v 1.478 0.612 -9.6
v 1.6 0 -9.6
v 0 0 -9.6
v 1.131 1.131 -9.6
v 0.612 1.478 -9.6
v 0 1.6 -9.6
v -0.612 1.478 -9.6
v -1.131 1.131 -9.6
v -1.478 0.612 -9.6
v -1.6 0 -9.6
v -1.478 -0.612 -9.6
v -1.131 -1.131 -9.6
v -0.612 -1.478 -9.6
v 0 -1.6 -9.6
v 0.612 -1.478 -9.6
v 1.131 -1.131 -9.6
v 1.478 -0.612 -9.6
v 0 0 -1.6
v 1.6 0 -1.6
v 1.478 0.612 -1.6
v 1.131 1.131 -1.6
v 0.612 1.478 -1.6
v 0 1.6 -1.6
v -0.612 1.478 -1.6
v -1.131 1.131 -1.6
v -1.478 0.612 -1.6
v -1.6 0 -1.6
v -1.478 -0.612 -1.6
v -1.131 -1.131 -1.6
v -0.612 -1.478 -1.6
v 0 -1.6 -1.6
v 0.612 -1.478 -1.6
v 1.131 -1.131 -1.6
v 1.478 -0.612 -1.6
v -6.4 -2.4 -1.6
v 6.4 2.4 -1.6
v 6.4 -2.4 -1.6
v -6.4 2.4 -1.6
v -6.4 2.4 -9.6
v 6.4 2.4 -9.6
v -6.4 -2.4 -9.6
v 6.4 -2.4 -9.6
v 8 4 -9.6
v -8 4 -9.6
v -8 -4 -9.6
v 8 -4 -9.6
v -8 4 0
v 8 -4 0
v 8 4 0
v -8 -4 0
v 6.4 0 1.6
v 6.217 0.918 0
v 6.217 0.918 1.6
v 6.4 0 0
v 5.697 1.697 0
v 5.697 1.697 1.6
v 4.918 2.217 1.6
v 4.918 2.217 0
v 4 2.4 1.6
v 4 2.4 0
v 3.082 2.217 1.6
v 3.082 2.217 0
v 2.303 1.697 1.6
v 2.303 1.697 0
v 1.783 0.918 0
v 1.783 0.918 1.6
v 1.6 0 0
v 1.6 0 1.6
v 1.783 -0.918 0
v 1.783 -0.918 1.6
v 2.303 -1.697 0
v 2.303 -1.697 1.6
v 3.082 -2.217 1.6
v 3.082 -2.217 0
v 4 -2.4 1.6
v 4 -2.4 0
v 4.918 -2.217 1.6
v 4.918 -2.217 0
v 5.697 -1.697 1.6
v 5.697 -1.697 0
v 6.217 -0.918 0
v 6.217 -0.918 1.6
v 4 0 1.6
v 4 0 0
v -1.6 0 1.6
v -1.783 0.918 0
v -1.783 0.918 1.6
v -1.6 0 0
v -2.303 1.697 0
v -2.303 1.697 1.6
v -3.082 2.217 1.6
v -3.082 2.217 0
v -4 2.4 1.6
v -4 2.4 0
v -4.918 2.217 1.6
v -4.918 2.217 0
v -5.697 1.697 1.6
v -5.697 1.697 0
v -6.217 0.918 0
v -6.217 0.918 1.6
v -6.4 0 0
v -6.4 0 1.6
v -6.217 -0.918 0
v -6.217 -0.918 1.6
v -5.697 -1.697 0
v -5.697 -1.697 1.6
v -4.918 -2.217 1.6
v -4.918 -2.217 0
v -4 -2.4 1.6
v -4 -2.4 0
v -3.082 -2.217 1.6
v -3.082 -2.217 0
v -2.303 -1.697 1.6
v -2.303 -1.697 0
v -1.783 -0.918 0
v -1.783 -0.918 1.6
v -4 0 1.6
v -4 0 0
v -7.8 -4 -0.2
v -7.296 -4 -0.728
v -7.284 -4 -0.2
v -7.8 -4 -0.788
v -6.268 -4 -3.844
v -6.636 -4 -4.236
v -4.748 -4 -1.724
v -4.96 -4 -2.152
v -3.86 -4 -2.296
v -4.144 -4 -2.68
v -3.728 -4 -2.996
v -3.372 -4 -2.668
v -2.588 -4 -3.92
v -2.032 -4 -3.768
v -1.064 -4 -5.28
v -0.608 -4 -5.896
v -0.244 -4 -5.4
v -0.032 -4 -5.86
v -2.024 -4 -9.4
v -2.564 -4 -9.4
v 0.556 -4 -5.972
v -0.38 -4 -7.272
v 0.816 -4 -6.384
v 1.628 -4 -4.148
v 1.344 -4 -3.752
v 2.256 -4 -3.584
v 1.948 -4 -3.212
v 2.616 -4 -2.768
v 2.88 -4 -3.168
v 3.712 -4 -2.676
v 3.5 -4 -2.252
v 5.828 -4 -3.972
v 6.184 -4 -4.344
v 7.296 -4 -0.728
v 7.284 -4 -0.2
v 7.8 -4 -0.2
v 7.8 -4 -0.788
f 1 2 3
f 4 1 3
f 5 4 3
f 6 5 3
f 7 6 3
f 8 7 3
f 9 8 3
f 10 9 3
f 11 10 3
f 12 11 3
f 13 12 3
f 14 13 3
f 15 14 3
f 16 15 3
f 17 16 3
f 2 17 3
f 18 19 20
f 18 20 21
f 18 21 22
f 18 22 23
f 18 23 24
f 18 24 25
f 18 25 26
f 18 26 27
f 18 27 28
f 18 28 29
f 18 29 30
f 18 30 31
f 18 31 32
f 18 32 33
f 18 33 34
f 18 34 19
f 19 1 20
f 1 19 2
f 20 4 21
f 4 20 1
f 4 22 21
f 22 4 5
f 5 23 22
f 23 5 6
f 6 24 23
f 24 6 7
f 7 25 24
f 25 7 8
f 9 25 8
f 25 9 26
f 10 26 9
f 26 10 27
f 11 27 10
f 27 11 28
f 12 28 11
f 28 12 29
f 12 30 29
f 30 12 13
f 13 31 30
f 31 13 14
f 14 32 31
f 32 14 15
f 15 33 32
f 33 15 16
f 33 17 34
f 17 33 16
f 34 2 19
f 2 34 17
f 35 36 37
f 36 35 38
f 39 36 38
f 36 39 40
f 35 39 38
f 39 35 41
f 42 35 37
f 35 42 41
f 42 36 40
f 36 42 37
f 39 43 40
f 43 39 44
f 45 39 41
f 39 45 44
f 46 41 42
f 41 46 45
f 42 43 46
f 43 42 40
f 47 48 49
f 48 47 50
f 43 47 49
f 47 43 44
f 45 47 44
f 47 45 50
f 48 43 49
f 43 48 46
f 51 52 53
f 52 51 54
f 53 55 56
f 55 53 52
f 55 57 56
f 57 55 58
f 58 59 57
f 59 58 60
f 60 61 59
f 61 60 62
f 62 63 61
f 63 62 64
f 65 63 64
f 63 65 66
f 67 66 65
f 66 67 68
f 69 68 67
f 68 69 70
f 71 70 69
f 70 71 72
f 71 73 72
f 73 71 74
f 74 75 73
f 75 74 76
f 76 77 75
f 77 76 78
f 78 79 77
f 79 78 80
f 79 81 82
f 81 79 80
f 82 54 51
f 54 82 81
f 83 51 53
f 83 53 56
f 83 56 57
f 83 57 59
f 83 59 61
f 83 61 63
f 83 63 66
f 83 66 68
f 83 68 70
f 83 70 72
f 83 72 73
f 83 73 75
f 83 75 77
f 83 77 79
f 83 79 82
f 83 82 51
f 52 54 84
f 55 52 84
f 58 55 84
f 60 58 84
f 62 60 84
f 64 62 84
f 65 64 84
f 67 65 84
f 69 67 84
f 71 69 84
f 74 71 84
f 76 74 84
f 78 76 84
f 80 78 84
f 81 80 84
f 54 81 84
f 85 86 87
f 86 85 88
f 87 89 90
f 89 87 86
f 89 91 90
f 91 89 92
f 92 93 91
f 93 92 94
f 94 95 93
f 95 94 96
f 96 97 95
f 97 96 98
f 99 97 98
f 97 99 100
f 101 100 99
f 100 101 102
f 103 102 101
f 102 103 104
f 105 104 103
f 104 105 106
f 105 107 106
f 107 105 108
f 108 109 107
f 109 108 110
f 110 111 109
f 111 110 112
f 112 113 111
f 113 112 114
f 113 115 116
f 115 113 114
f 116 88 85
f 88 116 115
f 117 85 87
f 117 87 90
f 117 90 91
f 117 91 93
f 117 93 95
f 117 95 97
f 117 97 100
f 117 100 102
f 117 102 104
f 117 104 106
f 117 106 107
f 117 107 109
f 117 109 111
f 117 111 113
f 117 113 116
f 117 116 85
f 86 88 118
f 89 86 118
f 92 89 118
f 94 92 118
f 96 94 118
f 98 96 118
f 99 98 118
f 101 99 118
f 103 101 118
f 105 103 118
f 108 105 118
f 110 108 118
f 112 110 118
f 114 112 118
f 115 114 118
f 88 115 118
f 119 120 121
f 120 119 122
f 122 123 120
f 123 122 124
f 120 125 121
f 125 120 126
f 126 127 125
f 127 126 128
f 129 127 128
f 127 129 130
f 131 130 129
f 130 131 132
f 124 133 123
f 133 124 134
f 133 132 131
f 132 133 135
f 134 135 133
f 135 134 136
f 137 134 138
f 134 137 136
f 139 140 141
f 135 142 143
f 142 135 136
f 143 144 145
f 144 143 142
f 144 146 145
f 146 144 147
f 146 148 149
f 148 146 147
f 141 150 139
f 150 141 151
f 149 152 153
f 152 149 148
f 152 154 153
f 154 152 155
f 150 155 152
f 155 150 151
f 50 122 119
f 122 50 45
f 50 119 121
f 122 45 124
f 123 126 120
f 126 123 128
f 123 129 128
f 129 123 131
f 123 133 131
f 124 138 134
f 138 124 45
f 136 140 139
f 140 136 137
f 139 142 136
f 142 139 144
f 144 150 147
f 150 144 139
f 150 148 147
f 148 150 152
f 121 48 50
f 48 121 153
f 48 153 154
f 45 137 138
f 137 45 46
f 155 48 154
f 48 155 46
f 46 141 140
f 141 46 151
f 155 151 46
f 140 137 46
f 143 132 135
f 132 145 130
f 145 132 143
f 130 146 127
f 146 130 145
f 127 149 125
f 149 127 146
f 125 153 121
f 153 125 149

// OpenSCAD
// file: ../p/4-4edge.scad
use <../lib.scad>
function ldraw_lib__4_4edge() = [
// 0 Circle 1.0
// 0 Name: 4-4edge.dat
// 0 Author: James Jessiman
// 0 !LDRAW_ORG Primitive UPDATE 2017-01
// 0 !LICENSE Licensed under CC BY 2.0 and CC BY 4.0 : see CAreadme.txt
// 
// 0 BFC CERTIFY CCW
  [0,"BFC","CERTIFY"],
  [0,"BFC","CCW"],
// 
// 0 !HISTORY 1998-12-15 [PTadmin] Official Update 1998-10
// 0 !HISTORY 2005-12-28 [PTadmin] Official Update 2005-01
// 0 !HISTORY 2007-06-24 [PTadmin] Header formatted for Contributor Agreement
// 0 !HISTORY 2008-07-01 [PTadmin] Official Update 2008-01
// 0 !HISTORY 2017-01-15 [Steffen] BFCed
// 0 !HISTORY 2017-12-30 [PTadmin] Official Update 2017-01
// 
// 
// 2 24 1 0 0 0.9239 0 0.3827
  [2,24,1,0,0,0.9239,0,0.3827],
// 2 24 0.9239 0 0.3827 0.7071 0 0.7071
  [2,24,0.9239,0,0.3827,0.7071,0,0.7071],
// 2 24 0.7071 0 0.7071 0.3827 0 0.9239
  [2,24,0.7071,0,0.7071,0.3827,0,0.9239],
// 2 24 0.3827 0 0.9239 0 0 1
  [2,24,0.3827,0,0.9239,0,0,1],
// 2 24 0 0 1 -0.3827 0 0.9239
  [2,24,0,0,1,-0.3827,0,0.9239],
// 2 24 -0.3827 0 0.9239 -0.7071 0 0.7071
  [2,24,-0.3827,0,0.9239,-0.7071,0,0.7071],
// 2 24 -0.7071 0 0.7071 -0.9239 0 0.3827
  [2,24,-0.7071,0,0.7071,-0.9239,0,0.3827],
// 2 24 -0.9239 0 0.3827 -1 0 -0
  [2,24,-0.9239,0,0.3827,-1,0,-0],
// 2 24 -1 0 -0 -0.9239 0 -0.3827
  [2,24,-1,0,-0,-0.9239,0,-0.3827],
// 2 24 -0.9239 0 -0.3827 -0.7071 0 -0.7071
  [2,24,-0.9239,0,-0.3827,-0.7071,0,-0.7071],
// 2 24 -0.7071 0 -0.7071 -0.3827 0 -0.9239
  [2,24,-0.7071,0,-0.7071,-0.3827,0,-0.9239],
// 2 24 -0.3827 0 -0.9239 0 0 -1
  [2,24,-0.3827,0,-0.9239,0,0,-1],
// 2 24 0 0 -1 0.3827 0 -0.9239
  [2,24,0,0,-1,0.3827,0,-0.9239],
// 2 24 0.3827 0 -0.9239 0.7071 0 -0.7071
  [2,24,0.3827,0,-0.9239,0.7071,0,-0.7071],
// 2 24 0.7071 0 -0.7071 0.9239 0 -0.3827
  [2,24,0.7071,0,-0.7071,0.9239,0,-0.3827],
// 2 24 0.9239 0 -0.3827 1 0 0
  [2,24,0.9239,0,-0.3827,1,0,0],
];
module ldraw_lib__4_4edge(step=0, col=false, unit=2/5, alt=false, line=0.2, solid=!$preview)
    makepoly(ldraw_lib__4_4edge(), step=step, col=col, unit=unit, alt=alt, line=line, solid=solid);
ldraw_lib__4_4edge(line=0.2);
// file: ../p/4-4disc.scad
use <../lib.scad>
function ldraw_lib__4_4disc() = [
// 0 Disc 1.0
// 0 Name: 4-4disc.dat
// 0 Author: James Jessiman
// 0 !LDRAW_ORG Primitive UPDATE 2002-02
// 0 !LICENSE Licensed under CC BY 2.0 and CC BY 4.0 : see CAreadme.txt
// 
// 0 BFC CERTIFY CCW
  [0,"BFC","CERTIFY"],
  [0,"BFC","CCW"],
// 
// 0 !HISTORY 1998-12-15 [PTadmin] Official Update 1998-10
// 0 !HISTORY 2002-03-23 [sbliss] Added BFC statement
// 0 !HISTORY 2002-04-25 [PTadmin] Official Update 2002-02
// 0 !HISTORY 2007-06-24 [PTadmin] Header formatted for Contributor Agreement
// 0 !HISTORY 2008-07-01 [PTadmin] Official Update 2008-01
// 
// 
// 3 16 0 0 0 1 0 0 0.9239 0 0.3827
  [3,16,0,0,0,1,0,0,0.9239,0,0.3827],
// 3 16 0 0 0 0.9239 0 0.3827 0.7071 0 0.7071
  [3,16,0,0,0,0.9239,0,0.3827,0.7071,0,0.7071],
// 3 16 0 0 0 0.7071 0 0.7071 0.3827 0 0.9239
  [3,16,0,0,0,0.7071,0,0.7071,0.3827,0,0.9239],
// 3 16 0 0 0 0.3827 0 0.9239 0 0 1
  [3,16,0,0,0,0.3827,0,0.9239,0,0,1],
// 3 16 0 0 0 0 0 1 -0.3827 0 0.9239
  [3,16,0,0,0,0,0,1,-0.3827,0,0.9239],
// 3 16 0 0 0 -0.3827 0 0.9239 -0.7071 0 0.7071
  [3,16,0,0,0,-0.3827,0,0.9239,-0.7071,0,0.7071],
// 3 16 0 0 0 -0.7071 0 0.7071 -0.9239 0 0.3827
  [3,16,0,0,0,-0.7071,0,0.7071,-0.9239,0,0.3827],
// 3 16 0 0 0 -0.9239 0 0.3827 -1 0 -0
  [3,16,0,0,0,-0.9239,0,0.3827,-1,0,-0],
// 3 16 0 0 0 -1 0 -0 -0.9239 0 -0.3827
  [3,16,0,0,0,-1,0,-0,-0.9239,0,-0.3827],
// 3 16 0 0 0 -0.9239 0 -0.3827 -0.7071 0 -0.7071
  [3,16,0,0,0,-0.9239,0,-0.3827,-0.7071,0,-0.7071],
// 3 16 0 0 0 -0.7071 0 -0.7071 -0.3827 0 -0.9239
  [3,16,0,0,0,-0.7071,0,-0.7071,-0.3827,0,-0.9239],
// 3 16 0 0 0 -0.3827 0 -0.9239 0 0 -1
  [3,16,0,0,0,-0.3827,0,-0.9239,0,0,-1],
// 3 16 0 0 0 0 0 -1 0.3827 0 -0.9239
  [3,16,0,0,0,0,0,-1,0.3827,0,-0.9239],
// 3 16 0 0 0 0.3827 0 -0.9239 0.7071 0 -0.7071
  [3,16,0,0,0,0.3827,0,-0.9239,0.7071,0,-0.7071],
// 3 16 0 0 0 0.7071 0 -0.7071 0.9239 0 -0.3827
  [3,16,0,0,0,0.7071,0,-0.7071,0.9239,0,-0.3827],
// 3 16 0 0 0 0.9239 0 -0.3827 1 0 0
  [3,16,0,0,0,0.9239,0,-0.3827,1,0,0],
// 0
];
module ldraw_lib__4_4disc(step=0, col=false, unit=2/5, alt=false, line=0.2, solid=!$preview)
    makepoly(ldraw_lib__4_4disc(), step=step, col=col, unit=unit, alt=alt, line=line, solid=solid);
ldraw_lib__4_4disc(line=0.2);
// file: ../p/4-4cyli.scad
use <../lib.scad>
$fa=1; $fs=0.2;
function ldraw_lib__4_4cyli(realsolid=false) = [
// 0 Cylinder 1.0
// 0 Name: 4-4cyli.dat
// 0 Author: James Jessiman
// 0 !LDRAW_ORG Primitive UPDATE 2005-01
// 0 !LICENSE Licensed under CC BY 2.0 and CC BY 4.0 : see CAreadme.txt
// 
// 0 BFC CERTIFY CCW
  [0,"BFC","CERTIFY"],
  [0,"BFC","CCW"],
// 
// 0 !HISTORY 1998-12-15 [PTadmin] Official Update 1998-10
// 0 !HISTORY 2002-03-23 [sbliss] Added BFC statement; merged headers from files in distributions LDraw 0.27 and Complete.
// 0 !HISTORY 2002-04-25 [PTadmin] Official Update 2002-02
// 0 !HISTORY 2004-12-14 [guyvivan] BFC CCW
// 0 !HISTORY 2005-12-28 [PTadmin] Official Update 2005-01
// 0 !HISTORY 2007-06-24 [PTadmin] Header formatted for Contributor Agreement
// 0 !HISTORY 2008-07-01 [PTadmin] Official Update 2008-01
// 
// 
// 4 16 1 1 0 0.9239 1 0.3827 0.9239 0 0.3827 1 0 0
  [4,16,1,1,0,0.9239,1,0.3827,0.9239,0,0.3827,1,0,0],
// 5 24 1 0 0 1 1 0 0.9239 0 0.3827 0.9239 0 -0.3827
  [5,24,1,0,0,1,1,0,0.9239,0,0.3827,0.9239,0,-0.3827],
// 4 16 0.9239 1 0.3827 0.7071 1 0.7071 0.7071 0 0.7071 0.9239 0 0.3827
  [4,16,0.9239,1,0.3827,0.7071,1,0.7071,0.7071,0,0.7071,0.9239,0,0.3827],
// 5 24 0.9239 0 0.3827 0.9239 1 0.3827 0.7071 0 0.7071 1 0 0
  [5,24,0.9239,0,0.3827,0.9239,1,0.3827,0.7071,0,0.7071,1,0,0],
// 4 16 0.7071 1 0.7071 0.3827 1 0.9239 0.3827 0 0.9239 0.7071 0 0.7071
  [4,16,0.7071,1,0.7071,0.3827,1,0.9239,0.3827,0,0.9239,0.7071,0,0.7071],
// 5 24 0.7071 0 0.7071 0.7071 1 0.7071 0.3827 0 0.9239 0.9239 0 0.3827
  [5,24,0.7071,0,0.7071,0.7071,1,0.7071,0.3827,0,0.9239,0.9239,0,0.3827],
// 4 16 0.3827 1 0.9239 0 1 1 0 0 1 0.3827 0 0.9239
  [4,16,0.3827,1,0.9239,0,1,1,0,0,1,0.3827,0,0.9239],
// 5 24 0.3827 0 0.9239 0.3827 1 0.9239 0 0 1 0.7071 0 0.7071
  [5,24,0.3827,0,0.9239,0.3827,1,0.9239,0,0,1,0.7071,0,0.7071],
// 4 16 0 1 1 -0.3827 1 0.9239 -0.3827 0 0.9239 0 0 1
  [4,16,0,1,1,-0.3827,1,0.9239,-0.3827,0,0.9239,0,0,1],
// 5 24 0 0 1 0 1 1 -0.3827 0 0.9239 0.3827 0 0.9239
  [5,24,0,0,1,0,1,1,-0.3827,0,0.9239,0.3827,0,0.9239],
// 4 16 -0.3827 1 0.9239 -0.7071 1 0.7071 -0.7071 0 0.7071 -0.3827 0 0.9239
  [4,16,-0.3827,1,0.9239,-0.7071,1,0.7071,-0.7071,0,0.7071,-0.3827,0,0.9239],
// 5 24 -0.3827 0 0.9239 -0.3827 1 0.9239 -0.7071 0 0.7071 0 0 1
  [5,24,-0.3827,0,0.9239,-0.3827,1,0.9239,-0.7071,0,0.7071,0,0,1],
// 4 16 -0.7071 1 0.7071 -0.9239 1 0.3827 -0.9239 0 0.3827 -0.7071 0 0.7071
  [4,16,-0.7071,1,0.7071,-0.9239,1,0.3827,-0.9239,0,0.3827,-0.7071,0,0.7071],
// 5 24 -0.7071 0 0.7071 -0.7071 1 0.7071 -0.9239 0 0.3827 -0.3827 0 0.9239
  [5,24,-0.7071,0,0.7071,-0.7071,1,0.7071,-0.9239,0,0.3827,-0.3827,0,0.9239],
// 4 16 -0.9239 1 0.3827 -1 1 0 -1 0 0 -0.9239 0 0.3827
  [4,16,-0.9239,1,0.3827,-1,1,0,-1,0,0,-0.9239,0,0.3827],
// 5 24 -0.9239 0 0.3827 -0.9239 1 0.3827 -1 0 0 -0.7071 0 0.7071
  [5,24,-0.9239,0,0.3827,-0.9239,1,0.3827,-1,0,0,-0.7071,0,0.7071],
// 4 16 -1 1 0 -0.9239 1 -0.3827 -0.9239 0 -0.3827 -1 0 0
  [4,16,-1,1,0,-0.9239,1,-0.3827,-0.9239,0,-0.3827,-1,0,0],
// 5 24 -1 0 0 -1 1 0 -0.9239 0 -0.3827 -0.9239 0 0.3827
  [5,24,-1,0,0,-1,1,0,-0.9239,0,-0.3827,-0.9239,0,0.3827],
// 4 16 -0.9239 1 -0.3827 -0.7071 1 -0.7071 -0.7071 0 -0.7071 -0.9239 0 -0.3827
  [4,16,-0.9239,1,-0.3827,-0.7071,1,-0.7071,-0.7071,0,-0.7071,-0.9239,0,-0.3827],
// 5 24 -0.9239 0 -0.3827 -0.9239 1 -0.3827 -0.7071 0 -0.7071 -1 0 0
  [5,24,-0.9239,0,-0.3827,-0.9239,1,-0.3827,-0.7071,0,-0.7071,-1,0,0],
// 4 16 -0.7071 1 -0.7071 -0.3827 1 -0.9239 -0.3827 0 -0.9239 -0.7071 0 -0.7071
  [4,16,-0.7071,1,-0.7071,-0.3827,1,-0.9239,-0.3827,0,-0.9239,-0.7071,0,-0.7071],
// 5 24 -0.7071 0 -0.7071 -0.7071 1 -0.7071 -0.3827 0 -0.9239 -0.9239 0 -0.3827
  [5,24,-0.7071,0,-0.7071,-0.7071,1,-0.7071,-0.3827,0,-0.9239,-0.9239,0,-0.3827],
// 4 16 -0.3827 1 -0.9239 0 1 -1 0 0 -1 -0.3827 0 -0.9239
  [4,16,-0.3827,1,-0.9239,0,1,-1,0,0,-1,-0.3827,0,-0.9239],
// 5 24 -0.3827 0 -0.9239 -0.3827 1 -0.9239 0 0 -1 -0.7071 0 -0.7071
  [5,24,-0.3827,0,-0.9239,-0.3827,1,-0.9239,0,0,-1,-0.7071,0,-0.7071],
// 4 16 0 1 -1 0.3827 1 -0.9239 0.3827 0 -0.9239 0 0 -1
  [4,16,0,1,-1,0.3827,1,-0.9239,0.3827,0,-0.9239,0,0,-1],
// 5 24 0 0 -1 0 1 -1 0.3827 0 -0.9239 -0.3827 0 -0.9239
  [5,24,0,0,-1,0,1,-1,0.3827,0,-0.9239,-0.3827,0,-0.9239],
// 4 16 0.3827 1 -0.9239 0.7071 1 -0.7071 0.7071 0 -0.7071 0.3827 0 -0.9239
  [4,16,0.3827,1,-0.9239,0.7071,1,-0.7071,0.7071,0,-0.7071,0.3827,0,-0.9239],
// 5 24 0.3827 0 -0.9239 0.3827 1 -0.9239 0.7071 0 -0.7071 0 0 -1
  [5,24,0.3827,0,-0.9239,0.3827,1,-0.9239,0.7071,0,-0.7071,0,0,-1],
// 4 16 0.7071 1 -0.7071 0.9239 1 -0.3827 0.9239 0 -0.3827 0.7071 0 -0.7071
  [4,16,0.7071,1,-0.7071,0.9239,1,-0.3827,0.9239,0,-0.3827,0.7071,0,-0.7071],
// 5 24 0.7071 0 -0.7071 0.7071 1 -0.7071 0.9239 0 -0.3827 0.3827 0 -0.9239
  [5,24,0.7071,0,-0.7071,0.7071,1,-0.7071,0.9239,0,-0.3827,0.3827,0,-0.9239],
// 4 16 0.9239 1 -0.3827 1 1 0 1 0 0 0.9239 0 -0.3827
  [4,16,0.9239,1,-0.3827,1,1,0,1,0,0,0.9239,0,-0.3827],
// 5 24 0.9239 0 -0.3827 0.9239 1 -0.3827 1 0 0 0.7071 0 -0.7071
  [5,24,0.9239,0,-0.3827,0.9239,1,-0.3827,1,0,0,0.7071,0,-0.7071],
// 0
];
module ldraw_lib__4_4cyli(step=0, col=false, unit=2/5, alt=false, line=0.2, solid=!$preview)
    makepoly(ldraw_lib__4_4cyli(solid), step=step, col=col, unit=unit, alt=alt, line=line, solid=solid);
ldraw_lib__4_4cyli(line=0.2);
// file: ../p/stud3.scad
use <../lib.scad>
use <4-4cyli.scad>
use <4-4disc.scad>
use <4-4edge.scad>
function ldraw_lib__stud3() = [
// 0 Stud Tube Solid
// 0 Name: stud3.dat
// 0 Author: James Jessiman
// 0 !LDRAW_ORG Primitive UPDATE 2012-01
// 0 !LICENSE Licensed under CC BY 4.0 : see CAreadme.txt
// 
// 0 BFC CERTIFY CCW
  [0,"BFC","CERTIFY"],
  [0,"BFC","CCW"],
// 
// 0 !HISTORY 2002-04-04 [sbliss] Modified for BFC compliance
// 0 !HISTORY 2002-04-25 [PTadmin] Official Update 2002-02
// 0 !HISTORY 2007-06-24 [PTadmin] Header formatted for Contributor Agreement
// 0 !HISTORY 2008-07-01 [PTadmin] Official Update 2008-01
// 0 !HISTORY 2012-02-16 [Philo] Changed to CCW
// 0 !HISTORY 2012-03-30 [PTadmin] Official Update 2012-01
// 
// 
// 1 16 0 -4 0 4 0 0 0 1 0 0 0 4 4-4edge.dat
  [1,16,0,-4,0,4,0,0,0,1,0,0,0,4, ldraw_lib__4_4edge()],
// 1 16 0 0 0 4 0 0 0 1 0 0 0 4 4-4edge.dat
  [1,16,0,0,0,4,0,0,0,1,0,0,0,4, ldraw_lib__4_4edge()],
// 1 16 0 -4 0 4 0 0 0 1 0 0 0 4 4-4disc.dat
  [1,16,0,-4,0,4,0,0,0,1,0,0,0,4, ldraw_lib__4_4disc()],
  [-1,16,0,0,0,4,0,0,0,-1,0,0,0,4, ldraw_lib__4_4disc()],
// 1 16 0 -4 0 4 0 0 0 4 0 0 0 4 4-4cyli.dat
  [1,16,0,-4,0,4,0,0,0,4,0,0,0,4, ldraw_lib__4_4cyli()],
];
module ldraw_lib__stud3(step=0, col=false, unit=2/5, alt=false, line=0.2, solid=!$preview)
    makepoly(ldraw_lib__stud3(), step=step, col=col, unit=unit, alt=alt, line=line, solid=solid);
ldraw_lib__stud3(line=0.2);
// file: ../p/stud.scad
use <../lib.scad>
use <4-4cyli.scad>
use <4-4disc.scad>
use <4-4edge.scad>
function ldraw_lib__stud() = [
// 0 Stud
// 0 Name: stud.dat
// 0 Author: James Jessiman
// 0 !LDRAW_ORG Primitive UPDATE 2012-01
// 0 !LICENSE Licensed under CC BY 4.0 : see CAreadme.txt
// 
// 0 BFC CERTIFY CCW
  [0,"BFC","CERTIFY"],
  [0,"BFC","CCW"],
// 
// 0 !HISTORY 2002-04-04 [sbliss] Modified for BFC compliance
// 0 !HISTORY 2002-04-25 [PTadmin] Official Update 2002-02
// 0 !HISTORY 2007-06-24 [PTadmin] Header formatted for Contributor Agreement
// 0 !HISTORY 2008-07-01 [PTadmin] Official Update 2008-01
// 0 !HISTORY 2012-02-16 [Philo] Changed to CCW
// 0 !HISTORY 2012-03-30 [PTadmin] Official Update 2012-01
// 
// 
// 1 16 0 0 0 6 0 0 0 1 0 0 0 6 4-4edge.dat
  [1,16,0,0,0,6,0,0,0,1,0,0,0,6, ldraw_lib__4_4edge()],
// 1 16 0 -4 0 6 0 0 0 1 0 0 0 6 4-4edge.dat
  [1,16,0,-4,0,6,0,0,0,1,0,0,0,6, ldraw_lib__4_4edge()],
// 1 16 0 0 0 6 0 0 0 -4 0 0 0 6 4-4cyli.dat
  [1,16,0,0,0,6,0,0,0,-4,0,0,0,6, ldraw_lib__4_4cyli()],
// 1 16 0 -4 0 6 0 0 0 1 0 0 0 6 4-4disc.dat
  [1,16,0,-4,0,6,0,0,0,1,0,0,0,6, ldraw_lib__4_4disc()],
  [-1,16,0,0,0,6,0,0,0,-1,0,0,0,6, ldraw_lib__4_4disc()],
];
module ldraw_lib__stud(step=0, col=false, unit=2/5, alt=false, line=0.2, solid=!$preview)
    makepoly(ldraw_lib__stud(), step=step, col=col, unit=unit, alt=alt, line=line, solid=solid);
ldraw_lib__stud(line=0.2);
// file: ../p/box5.scad
use <../lib.scad>
function ldraw_lib__box5() = [
// 0 Box with 5 Faces and All Edges
// 0 Name: box5.dat
// 0 Author: James Jessiman
// 0 !LDRAW_ORG Primitive UPDATE 2012-01
// 0 !LICENSE Licensed under CC BY 2.0 and CC BY 4.0 : see CAreadme.txt
// 
// 0 BFC CERTIFY CCW
  [0,"BFC","CERTIFY"],
  [0,"BFC","CCW"],
// 
// 0 !HISTORY 2002-04-03 [sbliss] Modified for BFC compliance
// 0 !HISTORY 2002-04-25 [PTadmin] Official Update 2002-02
// 0 !HISTORY 2007-06-24 [PTadmin] Header formatted for Contributor Agreement
// 0 !HISTORY 2008-07-01 [PTadmin] Official Update 2008-01
// 0 !HISTORY 2012-02-16 [Philo] Changed to CCW
// 0 !HISTORY 2012-03-30 [PTadmin] Official Update 2012-01
// 
// 
// 2 24 1 1 1 -1 1 1
  [2,24,1,1,1,-1,1,1],
// 2 24 -1 1 1 -1 1 -1
  [2,24,-1,1,1,-1,1,-1],
// 2 24 -1 1 -1 1 1 -1
  [2,24,-1,1,-1,1,1,-1],
// 2 24 1 1 -1 1 1 1
  [2,24,1,1,-1,1,1,1],
// 2 24 1 0 1 -1 0 1
  [2,24,1,0,1,-1,0,1],
// 2 24 -1 0 1 -1 0 -1
  [2,24,-1,0,1,-1,0,-1],
// 2 24 -1 0 -1 1 0 -1
  [2,24,-1,0,-1,1,0,-1],
// 2 24 1 0 -1 1 0 1
  [2,24,1,0,-1,1,0,1],
// 2 24 1 0 1 1 1 1
  [2,24,1,0,1,1,1,1],
// 2 24 -1 0 1 -1 1 1
  [2,24,-1,0,1,-1,1,1],
// 2 24 1 0 -1 1 1 -1
  [2,24,1,0,-1,1,1,-1],
// 2 24 -1 0 -1 -1 1 -1
  [2,24,-1,0,-1,-1,1,-1],
// 4 16 -1 1 1 1 1 1 1 1 -1 -1 1 -1
  [4,16,-1,1,1,1,1,1,1,1,-1,-1,1,-1],
// 4 16 -1 1 1 -1 0 1 1 0 1 1 1 1
  [4,16,-1,1,1,-1,0,1,1,0,1,1,1,1],
// 4 16 -1 1 -1 -1 0 -1 -1 0 1 -1 1 1
  [4,16,-1,1,-1,-1,0,-1,-1,0,1,-1,1,1],
// 4 16 1 1 -1 1 0 -1 -1 0 -1 -1 1 -1
  [4,16,1,1,-1,1,0,-1,-1,0,-1,-1,1,-1],
// 4 16 1 1 1 1 0 1 1 0 -1 1 1 -1
  [4,16,1,1,1,1,0,1,1,0,-1,1,1,-1],
];
makepoly(ldraw_lib__box5(), line=0.2);
// file: ../p/box4t.scad
use <../lib.scad>
function ldraw_lib__box4t() = [
// 0 Box with 4 Adjacent Faces and All Edges
// 0 Name: box4t.dat
// 0 Author: Tore Eriksson [Tore_Eriksson]
// 0 !LDRAW_ORG Primitive UPDATE 2003-02
// 0 !LICENSE Licensed under CC BY 2.0 and CC BY 4.0 : see CAreadme.txt
// 
// 0 BFC CERTIFY CCW
  [0,"BFC","CERTIFY"],
  [0,"BFC","CCW"],
// 
// 0 !HISTORY 1997-09-29 [PTadmin] Official Update 1997-15
// 0 !HISTORY 2002-08-31 [izanette] Modified with WINDZ for BFC compliance
// 0 !HISTORY 2003-08-01 [PTadmin] Official Update 2003-02
// 0 !HISTORY 2007-06-24 [PTadmin] Header formatted for Contributor Agreement
// 0 !HISTORY 2008-07-01 [PTadmin] Official Update 2008-01
// 
// 
// 2 24 1 1 1 -1 1 1
  [2,24,1,1,1,-1,1,1],
// 2 24 -1 1 1 -1 1 -1
  [2,24,-1,1,1,-1,1,-1],
// 2 24 -1 1 -1 1 1 -1
  [2,24,-1,1,-1,1,1,-1],
// 2 24 1 1 -1 1 1 1
  [2,24,1,1,-1,1,1,1],
// 2 24 1 0 1 -1 0 1
  [2,24,1,0,1,-1,0,1],
// 2 24 -1 0 1 -1 0 -1
  [2,24,-1,0,1,-1,0,-1],
// 2 24 -1 0 -1 1 0 -1
  [2,24,-1,0,-1,1,0,-1],
// 2 24 1 0 -1 1 0 1
  [2,24,1,0,-1,1,0,1],
// 2 24 1 0 1 1 1 1
  [2,24,1,0,1,1,1,1],
// 2 24 -1 0 1 -1 1 1
  [2,24,-1,0,1,-1,1,1],
// 2 24 1 0 -1 1 1 -1
  [2,24,1,0,-1,1,1,-1],
// 2 24 -1 0 -1 -1 1 -1
  [2,24,-1,0,-1,-1,1,-1],
// 4 16 1 1 1 1 1 -1 -1 1 -1 -1 1 1
  [4,16,1,1,1,1,1,-1,-1,1,-1,-1,1,1],
// 4 16 1 1 1 -1 1 1 -1 0 1 1 0 1
  [4,16,1,1,1,-1,1,1,-1,0,1,1,0,1],
// 4 16 -1 1 1 -1 1 -1 -1 0 -1 -1 0 1
  [4,16,-1,1,1,-1,1,-1,-1,0,-1,-1,0,1],
// 0 4 16 -1 1 -1 -1 0 -1 1 0 -1 1 1 -1
// 4 16 1 1 -1 1 1 1 1 0 1 1 0 -1
  [4,16,1,1,-1,1,1,1,1,0,1,1,0,-1],
// 0
];
makepoly(ldraw_lib__box4t(), line=0.2);
// file: s/3004s01.scad
use <../../lib.scad>
use <../../p/box4t.scad>
use <../../p/box5.scad>
use <../../p/stud.scad>
use <../../p/stud3.scad>
$fa=1; $fs=0.2;
function ldraw_lib__s__3004s01(realsolid=false) = [
// 0 ~Brick  1 x  2 without Front Face
// 0 Name: s\3004s01.dat
// 0 Author: James Jessiman
// 0 !LDRAW_ORG Subpart UPDATE 2003-03
// 0 !LICENSE Licensed under CC BY 2.0 and CC BY 4.0 : see CAreadme.txt
// 
// 0 BFC CERTIFY CCW
  [0,"BFC","CERTIFY"],
  [0,"BFC","CCW"],
// 
// 0 !HISTORY 2003-09-07 [jriley] Subfiling, BFC
// 0 !HISTORY 2003-12-19 [PTadmin] Official Update 2003-03
// 0 !HISTORY 2007-08-29 [PTadmin] Header formatted for Contributor Agreement
// 0 !HISTORY 2008-07-01 [PTadmin] Official Update 2008-01
// 
// 
// 1 16 0 4 0 1 0 0 0 -5 0 0 0 1 stud3.dat
  [1,16,0,4,0,1,0,0,0,-5,0,0,0,1, ldraw_lib__stud3(realsolid)],
// 0 BFC INVERTNEXT
  [0,"BFC","INVERTNEXT"],
// 1 16 0 24 0 16 0 0 0 -20 0 0 0 6 box5.dat
  [1,16,0,24,0,16,0,0,0,-20,0,0,0,6, ldraw_lib__box5(realsolid)],
// 4 16 20 24 10 16 24 6 -16 24 6 -20 24 10
  [4,16,20,24,10,16,24,6,-16,24,6,-20,24,10],
// 4 16 -20 24 10 -16 24 6 -16 24 -6 -20 24 -10
  [4,16,-20,24,10,-16,24,6,-16,24,-6,-20,24,-10],
// 4 16 -20 24 -10 -16 24 -6 16 24 -6 20 24 -10
  [4,16,-20,24,-10,-16,24,-6,16,24,-6,20,24,-10],
// 4 16 20 24 -10 16 24 -6 16 24 6 20 24 10
  [4,16,20,24,-10,16,24,-6,16,24,6,20,24,10],
// 1 16 0 24 0 20 0 0 0 -24 0 0 0 10 box4t.dat
  [1,16,0,24,0,20,0,0,0,-24,0,0,0,10, ldraw_lib__box4t(realsolid)],
// 1 16 10 0 0 1 0 0 0 1 0 0 0 1 stud.dat
  [1,16,10,0,0,1,0,0,0,1,0,0,0,1, ldraw_lib__stud(realsolid)],
// 1 16 -10 0 0 1 0 0 0 1 0 0 0 1 stud.dat
  [1,16,-10,0,0,1,0,0,0,1,0,0,0,1, ldraw_lib__stud(realsolid)],
// 0
];
module ldraw_lib__s__3004s01(step=0, col=false, unit=2/5, alt=false, line=0.2, solid=!$preview)
    makepoly(ldraw_lib__s__3004s01(solid), step=step, col=col, unit=unit, alt=alt, line=line, solid=solid);
ldraw_lib__s__3004s01(line=0.2);
// main file
use <../lib.scad>
use <s/3004s01.scad>
function ldraw_lib__3004pz1() = [
// 0 Brick  1 x  2 with Collar and Tan Skin Pattern
// 0 Name: 3004pz1.dat
// 0 Author: Damien Roux [Darats]
// 0 !LDRAW_ORG Part UPDATE 2017-01
// 0 !LICENSE Licensed under CC BY 4.0 : see CAreadme.txt
// 
// 0 BFC CERTIFY CCW
  [0,"BFC","CERTIFY"],
  [0,"BFC","CCW"],
// 
// 0 !KEYWORDS Brickheadz, BrickLink 3004pb154, Captain Jack Sparrow
// 0 !KEYWORDS Rebrickable 3004pr0026, Set 41593
// 
// 0 !HISTORY 2017-12-30 [PTadmin] Official Update 2017-01
// 
// 
// 1 16 0 0 0 1 0 0 0 1 0 0 0 1 s\3004s01.dat
  [1,16,0,0,0,1,0,0,0,1,0,0,0,1, ldraw_lib__s__3004s01()],
// 4 0 -18.21 0.5 -10 -19.5 0.5 -10 -19.5 1.97 -10 -18.24 1.82 -10
  [4,0,-18.21,0.5,-10,-19.5,0.5,-10,-19.5,1.97,-10,-18.24,1.82,-10],
// 4 0 -15.67 9.61 -10 -18.24 1.82 -10 -19.5 1.97 -10 -16.59 10.59 -10
  [4,0,-15.67,9.61,-10,-18.24,1.82,-10,-19.5,1.97,-10,-16.59,10.59,-10],
// 4 0 -12.4 5.38 -10 -11.87 4.31 -10 -18.21 0.5 -10 -18.24 1.82 -10
  [4,0,-12.4,5.38,-10,-11.87,4.31,-10,-18.21,0.5,-10,-18.24,1.82,-10],
// 4 0 -10.36 6.7 -10 -9.65 5.74 -10 -11.87 4.31 -10 -12.4 5.38 -10
  [4,0,-10.36,6.7,-10,-9.65,5.74,-10,-11.87,4.31,-10,-12.4,5.38,-10],
// 4 0 -9.32 7.49 -10 -8.43 6.67 -10 -9.65 5.74 -10 -10.36 6.7 -10
  [4,0,-9.32,7.49,-10,-8.43,6.67,-10,-9.65,5.74,-10,-10.36,6.7,-10],
// 4 0 -6.47 9.8 -10 -5.08 9.42 -10 -8.43 6.67 -10 -9.32 7.49 -10
  [4,0,-6.47,9.8,-10,-5.08,9.42,-10,-8.43,6.67,-10,-9.32,7.49,-10],
// 4 0 -2.66 13.2 -10 -15.67 9.61 -10 -16.59 10.59 -10 -1.52 14.74 -10
  [4,0,-2.66,13.2,-10,-15.67,9.61,-10,-16.59,10.59,-10,-1.52,14.74,-10],
// 4 0 -2.66 13.2 -10 -0.61 13.5 -10 -5.08 9.42 -10 -6.47 9.8 -10
  [4,0,-2.66,13.2,-10,-0.61,13.5,-10,-5.08,9.42,-10,-6.47,9.8,-10],
// 4 0 -0.61 13.5 -10 -2.66 13.2 -10 -1.52 14.74 -10 -0.08 14.65 -10
  [4,0,-0.61,13.5,-10,-2.66,13.2,-10,-1.52,14.74,-10,-0.08,14.65,-10],
// 4 0 -5.06 23.5 -10 -0.08 14.65 -10 -1.52 14.74 -10 -6.41 23.5 -10
  [4,0,-5.06,23.5,-10,-0.08,14.65,-10,-1.52,14.74,-10,-6.41,23.5,-10],
// 3 0 1.39 14.93 -10 -0.95 18.18 -10 2.04 15.96 -10
  [3,0,1.39,14.93,-10,-0.95,18.18,-10,2.04,15.96,-10],
// 4 0 -0.61 13.5 -10 -0.08 14.65 -10 4.07 10.37 -10 3.36 9.38 -10
  [4,0,-0.61,13.5,-10,-0.08,14.65,-10,4.07,10.37,-10,3.36,9.38,-10],
// 4 0 3.36 9.38 -10 4.07 10.37 -10 5.64 8.96 -10 4.87 8.03 -10
  [4,0,3.36,9.38,-10,4.07,10.37,-10,5.64,8.96,-10,4.87,8.03,-10],
// 4 0 4.87 8.03 -10 5.64 8.96 -10 7.2 7.92 -10 6.54 6.92 -10
  [4,0,4.87,8.03,-10,5.64,8.96,-10,7.2,7.92,-10,6.54,6.92,-10],
// 4 0 6.54 6.92 -10 7.2 7.92 -10 9.28 6.69 -10 8.75 5.63 -10
  [4,0,6.54,6.92,-10,7.2,7.92,-10,9.28,6.69,-10,8.75,5.63,-10],
// 4 0 14.57 9.93 -10 1.39 14.93 -10 2.04 15.96 -10 15.46 10.86 -10
  [4,0,14.57,9.93,-10,1.39,14.93,-10,2.04,15.96,-10,15.46,10.86,-10],
// 4 0 8.75 5.63 -10 9.28 6.69 -10 18.24 1.82 -10 18.21 0.5 -10
  [4,0,8.75,5.63,-10,9.28,6.69,-10,18.24,1.82,-10,18.21,0.5,-10],
// 4 0 18.21 0.5 -10 18.24 1.82 -10 19.5 1.97 -10 19.5 0.5 -10
  [4,0,18.21,0.5,-10,18.24,1.82,-10,19.5,1.97,-10,19.5,0.5,-10],
// 4 0 18.24 1.82 -10 14.57 9.93 -10 15.46 10.86 -10 19.5 1.97 -10
  [4,0,18.24,1.82,-10,14.57,9.93,-10,15.46,10.86,-10,19.5,1.97,-10],
// 4 16 -19.5 1.97 -10 -19.5 0.5 -10 -20 0 -10 -20 24 -10
  [4,16,-19.5,1.97,-10,-19.5,0.5,-10,-20,0,-10,-20,24,-10],
// 3 16 -20 0 -10 -19.5 0.5 -10 -18.21 0.5 -10
  [3,16,-20,0,-10,-19.5,0.5,-10,-18.21,0.5,-10],
// 3 16 -19.5 1.97 -10 -20 24 -10 -16.59 10.59 -10
  [3,16,-19.5,1.97,-10,-20,24,-10,-16.59,10.59,-10],
// 4 16 -12.4 5.38 -10 -18.24 1.82 -10 -15.67 9.61 -10 -10.36 6.7 -10
  [4,16,-12.4,5.38,-10,-18.24,1.82,-10,-15.67,9.61,-10,-10.36,6.7,-10],
// 4 16 -9.32 7.49 -10 -10.36 6.7 -10 -15.67 9.61 -10 -6.47 9.8 -10
  [4,16,-9.32,7.49,-10,-10.36,6.7,-10,-15.67,9.61,-10,-6.47,9.8,-10],
// 3 16 -15.67 9.61 -10 -2.66 13.2 -10 -6.47 9.8 -10
  [3,16,-15.67,9.61,-10,-2.66,13.2,-10,-6.47,9.8,-10],
// 4 16 -16.59 10.59 -10 -20 24 -10 -6.41 23.5 -10 -1.52 14.74 -10
  [4,16,-16.59,10.59,-10,-20,24,-10,-6.41,23.5,-10,-1.52,14.74,-10],
// 4 16 -0.95 18.18 -10 1.39 14.93 -10 -0.08 14.65 -10 -5.06 23.5 -10
  [4,16,-0.95,18.18,-10,1.39,14.93,-10,-0.08,14.65,-10,-5.06,23.5,-10],
// 4 16 1.39 14.93 -10 5.64 8.96 -10 4.07 10.37 -10 -0.08 14.65 -10
  [4,16,1.39,14.93,-10,5.64,8.96,-10,4.07,10.37,-10,-0.08,14.65,-10],
// 4 16 14.57 9.93 -10 7.2 7.92 -10 5.64 8.96 -10 1.39 14.93 -10
  [4,16,14.57,9.93,-10,7.2,7.92,-10,5.64,8.96,-10,1.39,14.93,-10],
// 4 16 14.57 9.93 -10 18.24 1.82 -10 9.28 6.69 -10 7.2 7.92 -10
  [4,16,14.57,9.93,-10,18.24,1.82,-10,9.28,6.69,-10,7.2,7.92,-10],
// 4 16 -20 0 -10 -18.21 0.5 -10 18.21 0.5 -10 20 0 -10
  [4,16,-20,0,-10,-18.21,0.5,-10,18.21,0.5,-10,20,0,-10],
// 3 16 20 0 -10 18.21 0.5 -10 19.5 0.5 -10
  [3,16,20,0,-10,18.21,0.5,-10,19.5,0.5,-10],
// 4 16 -5.06 23.5 -10 -6.41 23.5 -10 -20 24 -10 20 24 -10
  [4,16,-5.06,23.5,-10,-6.41,23.5,-10,-20,24,-10,20,24,-10],
// 4 16 20 0 -10 19.5 0.5 -10 19.5 1.97 -10 20 24 -10
  [4,16,20,0,-10,19.5,0.5,-10,19.5,1.97,-10,20,24,-10],
// 4 16 20 24 -10 15.46 10.86 -10 2.04 15.96 -10 -0.95 18.18 -10
  [4,16,20,24,-10,15.46,10.86,-10,2.04,15.96,-10,-0.95,18.18,-10],
// 3 16 19.5 1.97 -10 15.46 10.86 -10 20 24 -10
  [3,16,19.5,1.97,-10,15.46,10.86,-10,20,24,-10],
// 3 16 -0.95 18.18 -10 -5.06 23.5 -10 20 24 -10
  [3,16,-0.95,18.18,-10,-5.06,23.5,-10,20,24,-10],
// 3 19 3.36 9.38 -10 -5.08 9.42 -10 -0.61 13.5 -10
  [3,19,3.36,9.38,-10,-5.08,9.42,-10,-0.61,13.5,-10],
// 4 19 -8.43 6.67 -10 -5.08 9.42 -10 3.36 9.38 -10 4.87 8.03 -10
  [4,19,-8.43,6.67,-10,-5.08,9.42,-10,3.36,9.38,-10,4.87,8.03,-10],
// 4 19 -9.65 5.74 -10 -8.43 6.67 -10 4.87 8.03 -10 6.54 6.92 -10
  [4,19,-9.65,5.74,-10,-8.43,6.67,-10,4.87,8.03,-10,6.54,6.92,-10],
// 4 19 -11.87 4.31 -10 -9.65 5.74 -10 6.54 6.92 -10 8.75 5.63 -10
  [4,19,-11.87,4.31,-10,-9.65,5.74,-10,6.54,6.92,-10,8.75,5.63,-10],
// 4 19 -18.21 0.5 -10 -11.87 4.31 -10 8.75 5.63 -10 18.21 0.5 -10
  [4,19,-18.21,0.5,-10,-11.87,4.31,-10,8.75,5.63,-10,18.21,0.5,-10],
];
module ldraw_lib__3004pz1(step=0, col=false, unit=2/5, alt=false, line=0.2, solid=!$preview)
    makepoly(ldraw_lib__3004pz1(), step=step, col=col, unit=unit, alt=alt, line=line, solid=solid);
ldraw_lib__3004pz1(line=0.2);
